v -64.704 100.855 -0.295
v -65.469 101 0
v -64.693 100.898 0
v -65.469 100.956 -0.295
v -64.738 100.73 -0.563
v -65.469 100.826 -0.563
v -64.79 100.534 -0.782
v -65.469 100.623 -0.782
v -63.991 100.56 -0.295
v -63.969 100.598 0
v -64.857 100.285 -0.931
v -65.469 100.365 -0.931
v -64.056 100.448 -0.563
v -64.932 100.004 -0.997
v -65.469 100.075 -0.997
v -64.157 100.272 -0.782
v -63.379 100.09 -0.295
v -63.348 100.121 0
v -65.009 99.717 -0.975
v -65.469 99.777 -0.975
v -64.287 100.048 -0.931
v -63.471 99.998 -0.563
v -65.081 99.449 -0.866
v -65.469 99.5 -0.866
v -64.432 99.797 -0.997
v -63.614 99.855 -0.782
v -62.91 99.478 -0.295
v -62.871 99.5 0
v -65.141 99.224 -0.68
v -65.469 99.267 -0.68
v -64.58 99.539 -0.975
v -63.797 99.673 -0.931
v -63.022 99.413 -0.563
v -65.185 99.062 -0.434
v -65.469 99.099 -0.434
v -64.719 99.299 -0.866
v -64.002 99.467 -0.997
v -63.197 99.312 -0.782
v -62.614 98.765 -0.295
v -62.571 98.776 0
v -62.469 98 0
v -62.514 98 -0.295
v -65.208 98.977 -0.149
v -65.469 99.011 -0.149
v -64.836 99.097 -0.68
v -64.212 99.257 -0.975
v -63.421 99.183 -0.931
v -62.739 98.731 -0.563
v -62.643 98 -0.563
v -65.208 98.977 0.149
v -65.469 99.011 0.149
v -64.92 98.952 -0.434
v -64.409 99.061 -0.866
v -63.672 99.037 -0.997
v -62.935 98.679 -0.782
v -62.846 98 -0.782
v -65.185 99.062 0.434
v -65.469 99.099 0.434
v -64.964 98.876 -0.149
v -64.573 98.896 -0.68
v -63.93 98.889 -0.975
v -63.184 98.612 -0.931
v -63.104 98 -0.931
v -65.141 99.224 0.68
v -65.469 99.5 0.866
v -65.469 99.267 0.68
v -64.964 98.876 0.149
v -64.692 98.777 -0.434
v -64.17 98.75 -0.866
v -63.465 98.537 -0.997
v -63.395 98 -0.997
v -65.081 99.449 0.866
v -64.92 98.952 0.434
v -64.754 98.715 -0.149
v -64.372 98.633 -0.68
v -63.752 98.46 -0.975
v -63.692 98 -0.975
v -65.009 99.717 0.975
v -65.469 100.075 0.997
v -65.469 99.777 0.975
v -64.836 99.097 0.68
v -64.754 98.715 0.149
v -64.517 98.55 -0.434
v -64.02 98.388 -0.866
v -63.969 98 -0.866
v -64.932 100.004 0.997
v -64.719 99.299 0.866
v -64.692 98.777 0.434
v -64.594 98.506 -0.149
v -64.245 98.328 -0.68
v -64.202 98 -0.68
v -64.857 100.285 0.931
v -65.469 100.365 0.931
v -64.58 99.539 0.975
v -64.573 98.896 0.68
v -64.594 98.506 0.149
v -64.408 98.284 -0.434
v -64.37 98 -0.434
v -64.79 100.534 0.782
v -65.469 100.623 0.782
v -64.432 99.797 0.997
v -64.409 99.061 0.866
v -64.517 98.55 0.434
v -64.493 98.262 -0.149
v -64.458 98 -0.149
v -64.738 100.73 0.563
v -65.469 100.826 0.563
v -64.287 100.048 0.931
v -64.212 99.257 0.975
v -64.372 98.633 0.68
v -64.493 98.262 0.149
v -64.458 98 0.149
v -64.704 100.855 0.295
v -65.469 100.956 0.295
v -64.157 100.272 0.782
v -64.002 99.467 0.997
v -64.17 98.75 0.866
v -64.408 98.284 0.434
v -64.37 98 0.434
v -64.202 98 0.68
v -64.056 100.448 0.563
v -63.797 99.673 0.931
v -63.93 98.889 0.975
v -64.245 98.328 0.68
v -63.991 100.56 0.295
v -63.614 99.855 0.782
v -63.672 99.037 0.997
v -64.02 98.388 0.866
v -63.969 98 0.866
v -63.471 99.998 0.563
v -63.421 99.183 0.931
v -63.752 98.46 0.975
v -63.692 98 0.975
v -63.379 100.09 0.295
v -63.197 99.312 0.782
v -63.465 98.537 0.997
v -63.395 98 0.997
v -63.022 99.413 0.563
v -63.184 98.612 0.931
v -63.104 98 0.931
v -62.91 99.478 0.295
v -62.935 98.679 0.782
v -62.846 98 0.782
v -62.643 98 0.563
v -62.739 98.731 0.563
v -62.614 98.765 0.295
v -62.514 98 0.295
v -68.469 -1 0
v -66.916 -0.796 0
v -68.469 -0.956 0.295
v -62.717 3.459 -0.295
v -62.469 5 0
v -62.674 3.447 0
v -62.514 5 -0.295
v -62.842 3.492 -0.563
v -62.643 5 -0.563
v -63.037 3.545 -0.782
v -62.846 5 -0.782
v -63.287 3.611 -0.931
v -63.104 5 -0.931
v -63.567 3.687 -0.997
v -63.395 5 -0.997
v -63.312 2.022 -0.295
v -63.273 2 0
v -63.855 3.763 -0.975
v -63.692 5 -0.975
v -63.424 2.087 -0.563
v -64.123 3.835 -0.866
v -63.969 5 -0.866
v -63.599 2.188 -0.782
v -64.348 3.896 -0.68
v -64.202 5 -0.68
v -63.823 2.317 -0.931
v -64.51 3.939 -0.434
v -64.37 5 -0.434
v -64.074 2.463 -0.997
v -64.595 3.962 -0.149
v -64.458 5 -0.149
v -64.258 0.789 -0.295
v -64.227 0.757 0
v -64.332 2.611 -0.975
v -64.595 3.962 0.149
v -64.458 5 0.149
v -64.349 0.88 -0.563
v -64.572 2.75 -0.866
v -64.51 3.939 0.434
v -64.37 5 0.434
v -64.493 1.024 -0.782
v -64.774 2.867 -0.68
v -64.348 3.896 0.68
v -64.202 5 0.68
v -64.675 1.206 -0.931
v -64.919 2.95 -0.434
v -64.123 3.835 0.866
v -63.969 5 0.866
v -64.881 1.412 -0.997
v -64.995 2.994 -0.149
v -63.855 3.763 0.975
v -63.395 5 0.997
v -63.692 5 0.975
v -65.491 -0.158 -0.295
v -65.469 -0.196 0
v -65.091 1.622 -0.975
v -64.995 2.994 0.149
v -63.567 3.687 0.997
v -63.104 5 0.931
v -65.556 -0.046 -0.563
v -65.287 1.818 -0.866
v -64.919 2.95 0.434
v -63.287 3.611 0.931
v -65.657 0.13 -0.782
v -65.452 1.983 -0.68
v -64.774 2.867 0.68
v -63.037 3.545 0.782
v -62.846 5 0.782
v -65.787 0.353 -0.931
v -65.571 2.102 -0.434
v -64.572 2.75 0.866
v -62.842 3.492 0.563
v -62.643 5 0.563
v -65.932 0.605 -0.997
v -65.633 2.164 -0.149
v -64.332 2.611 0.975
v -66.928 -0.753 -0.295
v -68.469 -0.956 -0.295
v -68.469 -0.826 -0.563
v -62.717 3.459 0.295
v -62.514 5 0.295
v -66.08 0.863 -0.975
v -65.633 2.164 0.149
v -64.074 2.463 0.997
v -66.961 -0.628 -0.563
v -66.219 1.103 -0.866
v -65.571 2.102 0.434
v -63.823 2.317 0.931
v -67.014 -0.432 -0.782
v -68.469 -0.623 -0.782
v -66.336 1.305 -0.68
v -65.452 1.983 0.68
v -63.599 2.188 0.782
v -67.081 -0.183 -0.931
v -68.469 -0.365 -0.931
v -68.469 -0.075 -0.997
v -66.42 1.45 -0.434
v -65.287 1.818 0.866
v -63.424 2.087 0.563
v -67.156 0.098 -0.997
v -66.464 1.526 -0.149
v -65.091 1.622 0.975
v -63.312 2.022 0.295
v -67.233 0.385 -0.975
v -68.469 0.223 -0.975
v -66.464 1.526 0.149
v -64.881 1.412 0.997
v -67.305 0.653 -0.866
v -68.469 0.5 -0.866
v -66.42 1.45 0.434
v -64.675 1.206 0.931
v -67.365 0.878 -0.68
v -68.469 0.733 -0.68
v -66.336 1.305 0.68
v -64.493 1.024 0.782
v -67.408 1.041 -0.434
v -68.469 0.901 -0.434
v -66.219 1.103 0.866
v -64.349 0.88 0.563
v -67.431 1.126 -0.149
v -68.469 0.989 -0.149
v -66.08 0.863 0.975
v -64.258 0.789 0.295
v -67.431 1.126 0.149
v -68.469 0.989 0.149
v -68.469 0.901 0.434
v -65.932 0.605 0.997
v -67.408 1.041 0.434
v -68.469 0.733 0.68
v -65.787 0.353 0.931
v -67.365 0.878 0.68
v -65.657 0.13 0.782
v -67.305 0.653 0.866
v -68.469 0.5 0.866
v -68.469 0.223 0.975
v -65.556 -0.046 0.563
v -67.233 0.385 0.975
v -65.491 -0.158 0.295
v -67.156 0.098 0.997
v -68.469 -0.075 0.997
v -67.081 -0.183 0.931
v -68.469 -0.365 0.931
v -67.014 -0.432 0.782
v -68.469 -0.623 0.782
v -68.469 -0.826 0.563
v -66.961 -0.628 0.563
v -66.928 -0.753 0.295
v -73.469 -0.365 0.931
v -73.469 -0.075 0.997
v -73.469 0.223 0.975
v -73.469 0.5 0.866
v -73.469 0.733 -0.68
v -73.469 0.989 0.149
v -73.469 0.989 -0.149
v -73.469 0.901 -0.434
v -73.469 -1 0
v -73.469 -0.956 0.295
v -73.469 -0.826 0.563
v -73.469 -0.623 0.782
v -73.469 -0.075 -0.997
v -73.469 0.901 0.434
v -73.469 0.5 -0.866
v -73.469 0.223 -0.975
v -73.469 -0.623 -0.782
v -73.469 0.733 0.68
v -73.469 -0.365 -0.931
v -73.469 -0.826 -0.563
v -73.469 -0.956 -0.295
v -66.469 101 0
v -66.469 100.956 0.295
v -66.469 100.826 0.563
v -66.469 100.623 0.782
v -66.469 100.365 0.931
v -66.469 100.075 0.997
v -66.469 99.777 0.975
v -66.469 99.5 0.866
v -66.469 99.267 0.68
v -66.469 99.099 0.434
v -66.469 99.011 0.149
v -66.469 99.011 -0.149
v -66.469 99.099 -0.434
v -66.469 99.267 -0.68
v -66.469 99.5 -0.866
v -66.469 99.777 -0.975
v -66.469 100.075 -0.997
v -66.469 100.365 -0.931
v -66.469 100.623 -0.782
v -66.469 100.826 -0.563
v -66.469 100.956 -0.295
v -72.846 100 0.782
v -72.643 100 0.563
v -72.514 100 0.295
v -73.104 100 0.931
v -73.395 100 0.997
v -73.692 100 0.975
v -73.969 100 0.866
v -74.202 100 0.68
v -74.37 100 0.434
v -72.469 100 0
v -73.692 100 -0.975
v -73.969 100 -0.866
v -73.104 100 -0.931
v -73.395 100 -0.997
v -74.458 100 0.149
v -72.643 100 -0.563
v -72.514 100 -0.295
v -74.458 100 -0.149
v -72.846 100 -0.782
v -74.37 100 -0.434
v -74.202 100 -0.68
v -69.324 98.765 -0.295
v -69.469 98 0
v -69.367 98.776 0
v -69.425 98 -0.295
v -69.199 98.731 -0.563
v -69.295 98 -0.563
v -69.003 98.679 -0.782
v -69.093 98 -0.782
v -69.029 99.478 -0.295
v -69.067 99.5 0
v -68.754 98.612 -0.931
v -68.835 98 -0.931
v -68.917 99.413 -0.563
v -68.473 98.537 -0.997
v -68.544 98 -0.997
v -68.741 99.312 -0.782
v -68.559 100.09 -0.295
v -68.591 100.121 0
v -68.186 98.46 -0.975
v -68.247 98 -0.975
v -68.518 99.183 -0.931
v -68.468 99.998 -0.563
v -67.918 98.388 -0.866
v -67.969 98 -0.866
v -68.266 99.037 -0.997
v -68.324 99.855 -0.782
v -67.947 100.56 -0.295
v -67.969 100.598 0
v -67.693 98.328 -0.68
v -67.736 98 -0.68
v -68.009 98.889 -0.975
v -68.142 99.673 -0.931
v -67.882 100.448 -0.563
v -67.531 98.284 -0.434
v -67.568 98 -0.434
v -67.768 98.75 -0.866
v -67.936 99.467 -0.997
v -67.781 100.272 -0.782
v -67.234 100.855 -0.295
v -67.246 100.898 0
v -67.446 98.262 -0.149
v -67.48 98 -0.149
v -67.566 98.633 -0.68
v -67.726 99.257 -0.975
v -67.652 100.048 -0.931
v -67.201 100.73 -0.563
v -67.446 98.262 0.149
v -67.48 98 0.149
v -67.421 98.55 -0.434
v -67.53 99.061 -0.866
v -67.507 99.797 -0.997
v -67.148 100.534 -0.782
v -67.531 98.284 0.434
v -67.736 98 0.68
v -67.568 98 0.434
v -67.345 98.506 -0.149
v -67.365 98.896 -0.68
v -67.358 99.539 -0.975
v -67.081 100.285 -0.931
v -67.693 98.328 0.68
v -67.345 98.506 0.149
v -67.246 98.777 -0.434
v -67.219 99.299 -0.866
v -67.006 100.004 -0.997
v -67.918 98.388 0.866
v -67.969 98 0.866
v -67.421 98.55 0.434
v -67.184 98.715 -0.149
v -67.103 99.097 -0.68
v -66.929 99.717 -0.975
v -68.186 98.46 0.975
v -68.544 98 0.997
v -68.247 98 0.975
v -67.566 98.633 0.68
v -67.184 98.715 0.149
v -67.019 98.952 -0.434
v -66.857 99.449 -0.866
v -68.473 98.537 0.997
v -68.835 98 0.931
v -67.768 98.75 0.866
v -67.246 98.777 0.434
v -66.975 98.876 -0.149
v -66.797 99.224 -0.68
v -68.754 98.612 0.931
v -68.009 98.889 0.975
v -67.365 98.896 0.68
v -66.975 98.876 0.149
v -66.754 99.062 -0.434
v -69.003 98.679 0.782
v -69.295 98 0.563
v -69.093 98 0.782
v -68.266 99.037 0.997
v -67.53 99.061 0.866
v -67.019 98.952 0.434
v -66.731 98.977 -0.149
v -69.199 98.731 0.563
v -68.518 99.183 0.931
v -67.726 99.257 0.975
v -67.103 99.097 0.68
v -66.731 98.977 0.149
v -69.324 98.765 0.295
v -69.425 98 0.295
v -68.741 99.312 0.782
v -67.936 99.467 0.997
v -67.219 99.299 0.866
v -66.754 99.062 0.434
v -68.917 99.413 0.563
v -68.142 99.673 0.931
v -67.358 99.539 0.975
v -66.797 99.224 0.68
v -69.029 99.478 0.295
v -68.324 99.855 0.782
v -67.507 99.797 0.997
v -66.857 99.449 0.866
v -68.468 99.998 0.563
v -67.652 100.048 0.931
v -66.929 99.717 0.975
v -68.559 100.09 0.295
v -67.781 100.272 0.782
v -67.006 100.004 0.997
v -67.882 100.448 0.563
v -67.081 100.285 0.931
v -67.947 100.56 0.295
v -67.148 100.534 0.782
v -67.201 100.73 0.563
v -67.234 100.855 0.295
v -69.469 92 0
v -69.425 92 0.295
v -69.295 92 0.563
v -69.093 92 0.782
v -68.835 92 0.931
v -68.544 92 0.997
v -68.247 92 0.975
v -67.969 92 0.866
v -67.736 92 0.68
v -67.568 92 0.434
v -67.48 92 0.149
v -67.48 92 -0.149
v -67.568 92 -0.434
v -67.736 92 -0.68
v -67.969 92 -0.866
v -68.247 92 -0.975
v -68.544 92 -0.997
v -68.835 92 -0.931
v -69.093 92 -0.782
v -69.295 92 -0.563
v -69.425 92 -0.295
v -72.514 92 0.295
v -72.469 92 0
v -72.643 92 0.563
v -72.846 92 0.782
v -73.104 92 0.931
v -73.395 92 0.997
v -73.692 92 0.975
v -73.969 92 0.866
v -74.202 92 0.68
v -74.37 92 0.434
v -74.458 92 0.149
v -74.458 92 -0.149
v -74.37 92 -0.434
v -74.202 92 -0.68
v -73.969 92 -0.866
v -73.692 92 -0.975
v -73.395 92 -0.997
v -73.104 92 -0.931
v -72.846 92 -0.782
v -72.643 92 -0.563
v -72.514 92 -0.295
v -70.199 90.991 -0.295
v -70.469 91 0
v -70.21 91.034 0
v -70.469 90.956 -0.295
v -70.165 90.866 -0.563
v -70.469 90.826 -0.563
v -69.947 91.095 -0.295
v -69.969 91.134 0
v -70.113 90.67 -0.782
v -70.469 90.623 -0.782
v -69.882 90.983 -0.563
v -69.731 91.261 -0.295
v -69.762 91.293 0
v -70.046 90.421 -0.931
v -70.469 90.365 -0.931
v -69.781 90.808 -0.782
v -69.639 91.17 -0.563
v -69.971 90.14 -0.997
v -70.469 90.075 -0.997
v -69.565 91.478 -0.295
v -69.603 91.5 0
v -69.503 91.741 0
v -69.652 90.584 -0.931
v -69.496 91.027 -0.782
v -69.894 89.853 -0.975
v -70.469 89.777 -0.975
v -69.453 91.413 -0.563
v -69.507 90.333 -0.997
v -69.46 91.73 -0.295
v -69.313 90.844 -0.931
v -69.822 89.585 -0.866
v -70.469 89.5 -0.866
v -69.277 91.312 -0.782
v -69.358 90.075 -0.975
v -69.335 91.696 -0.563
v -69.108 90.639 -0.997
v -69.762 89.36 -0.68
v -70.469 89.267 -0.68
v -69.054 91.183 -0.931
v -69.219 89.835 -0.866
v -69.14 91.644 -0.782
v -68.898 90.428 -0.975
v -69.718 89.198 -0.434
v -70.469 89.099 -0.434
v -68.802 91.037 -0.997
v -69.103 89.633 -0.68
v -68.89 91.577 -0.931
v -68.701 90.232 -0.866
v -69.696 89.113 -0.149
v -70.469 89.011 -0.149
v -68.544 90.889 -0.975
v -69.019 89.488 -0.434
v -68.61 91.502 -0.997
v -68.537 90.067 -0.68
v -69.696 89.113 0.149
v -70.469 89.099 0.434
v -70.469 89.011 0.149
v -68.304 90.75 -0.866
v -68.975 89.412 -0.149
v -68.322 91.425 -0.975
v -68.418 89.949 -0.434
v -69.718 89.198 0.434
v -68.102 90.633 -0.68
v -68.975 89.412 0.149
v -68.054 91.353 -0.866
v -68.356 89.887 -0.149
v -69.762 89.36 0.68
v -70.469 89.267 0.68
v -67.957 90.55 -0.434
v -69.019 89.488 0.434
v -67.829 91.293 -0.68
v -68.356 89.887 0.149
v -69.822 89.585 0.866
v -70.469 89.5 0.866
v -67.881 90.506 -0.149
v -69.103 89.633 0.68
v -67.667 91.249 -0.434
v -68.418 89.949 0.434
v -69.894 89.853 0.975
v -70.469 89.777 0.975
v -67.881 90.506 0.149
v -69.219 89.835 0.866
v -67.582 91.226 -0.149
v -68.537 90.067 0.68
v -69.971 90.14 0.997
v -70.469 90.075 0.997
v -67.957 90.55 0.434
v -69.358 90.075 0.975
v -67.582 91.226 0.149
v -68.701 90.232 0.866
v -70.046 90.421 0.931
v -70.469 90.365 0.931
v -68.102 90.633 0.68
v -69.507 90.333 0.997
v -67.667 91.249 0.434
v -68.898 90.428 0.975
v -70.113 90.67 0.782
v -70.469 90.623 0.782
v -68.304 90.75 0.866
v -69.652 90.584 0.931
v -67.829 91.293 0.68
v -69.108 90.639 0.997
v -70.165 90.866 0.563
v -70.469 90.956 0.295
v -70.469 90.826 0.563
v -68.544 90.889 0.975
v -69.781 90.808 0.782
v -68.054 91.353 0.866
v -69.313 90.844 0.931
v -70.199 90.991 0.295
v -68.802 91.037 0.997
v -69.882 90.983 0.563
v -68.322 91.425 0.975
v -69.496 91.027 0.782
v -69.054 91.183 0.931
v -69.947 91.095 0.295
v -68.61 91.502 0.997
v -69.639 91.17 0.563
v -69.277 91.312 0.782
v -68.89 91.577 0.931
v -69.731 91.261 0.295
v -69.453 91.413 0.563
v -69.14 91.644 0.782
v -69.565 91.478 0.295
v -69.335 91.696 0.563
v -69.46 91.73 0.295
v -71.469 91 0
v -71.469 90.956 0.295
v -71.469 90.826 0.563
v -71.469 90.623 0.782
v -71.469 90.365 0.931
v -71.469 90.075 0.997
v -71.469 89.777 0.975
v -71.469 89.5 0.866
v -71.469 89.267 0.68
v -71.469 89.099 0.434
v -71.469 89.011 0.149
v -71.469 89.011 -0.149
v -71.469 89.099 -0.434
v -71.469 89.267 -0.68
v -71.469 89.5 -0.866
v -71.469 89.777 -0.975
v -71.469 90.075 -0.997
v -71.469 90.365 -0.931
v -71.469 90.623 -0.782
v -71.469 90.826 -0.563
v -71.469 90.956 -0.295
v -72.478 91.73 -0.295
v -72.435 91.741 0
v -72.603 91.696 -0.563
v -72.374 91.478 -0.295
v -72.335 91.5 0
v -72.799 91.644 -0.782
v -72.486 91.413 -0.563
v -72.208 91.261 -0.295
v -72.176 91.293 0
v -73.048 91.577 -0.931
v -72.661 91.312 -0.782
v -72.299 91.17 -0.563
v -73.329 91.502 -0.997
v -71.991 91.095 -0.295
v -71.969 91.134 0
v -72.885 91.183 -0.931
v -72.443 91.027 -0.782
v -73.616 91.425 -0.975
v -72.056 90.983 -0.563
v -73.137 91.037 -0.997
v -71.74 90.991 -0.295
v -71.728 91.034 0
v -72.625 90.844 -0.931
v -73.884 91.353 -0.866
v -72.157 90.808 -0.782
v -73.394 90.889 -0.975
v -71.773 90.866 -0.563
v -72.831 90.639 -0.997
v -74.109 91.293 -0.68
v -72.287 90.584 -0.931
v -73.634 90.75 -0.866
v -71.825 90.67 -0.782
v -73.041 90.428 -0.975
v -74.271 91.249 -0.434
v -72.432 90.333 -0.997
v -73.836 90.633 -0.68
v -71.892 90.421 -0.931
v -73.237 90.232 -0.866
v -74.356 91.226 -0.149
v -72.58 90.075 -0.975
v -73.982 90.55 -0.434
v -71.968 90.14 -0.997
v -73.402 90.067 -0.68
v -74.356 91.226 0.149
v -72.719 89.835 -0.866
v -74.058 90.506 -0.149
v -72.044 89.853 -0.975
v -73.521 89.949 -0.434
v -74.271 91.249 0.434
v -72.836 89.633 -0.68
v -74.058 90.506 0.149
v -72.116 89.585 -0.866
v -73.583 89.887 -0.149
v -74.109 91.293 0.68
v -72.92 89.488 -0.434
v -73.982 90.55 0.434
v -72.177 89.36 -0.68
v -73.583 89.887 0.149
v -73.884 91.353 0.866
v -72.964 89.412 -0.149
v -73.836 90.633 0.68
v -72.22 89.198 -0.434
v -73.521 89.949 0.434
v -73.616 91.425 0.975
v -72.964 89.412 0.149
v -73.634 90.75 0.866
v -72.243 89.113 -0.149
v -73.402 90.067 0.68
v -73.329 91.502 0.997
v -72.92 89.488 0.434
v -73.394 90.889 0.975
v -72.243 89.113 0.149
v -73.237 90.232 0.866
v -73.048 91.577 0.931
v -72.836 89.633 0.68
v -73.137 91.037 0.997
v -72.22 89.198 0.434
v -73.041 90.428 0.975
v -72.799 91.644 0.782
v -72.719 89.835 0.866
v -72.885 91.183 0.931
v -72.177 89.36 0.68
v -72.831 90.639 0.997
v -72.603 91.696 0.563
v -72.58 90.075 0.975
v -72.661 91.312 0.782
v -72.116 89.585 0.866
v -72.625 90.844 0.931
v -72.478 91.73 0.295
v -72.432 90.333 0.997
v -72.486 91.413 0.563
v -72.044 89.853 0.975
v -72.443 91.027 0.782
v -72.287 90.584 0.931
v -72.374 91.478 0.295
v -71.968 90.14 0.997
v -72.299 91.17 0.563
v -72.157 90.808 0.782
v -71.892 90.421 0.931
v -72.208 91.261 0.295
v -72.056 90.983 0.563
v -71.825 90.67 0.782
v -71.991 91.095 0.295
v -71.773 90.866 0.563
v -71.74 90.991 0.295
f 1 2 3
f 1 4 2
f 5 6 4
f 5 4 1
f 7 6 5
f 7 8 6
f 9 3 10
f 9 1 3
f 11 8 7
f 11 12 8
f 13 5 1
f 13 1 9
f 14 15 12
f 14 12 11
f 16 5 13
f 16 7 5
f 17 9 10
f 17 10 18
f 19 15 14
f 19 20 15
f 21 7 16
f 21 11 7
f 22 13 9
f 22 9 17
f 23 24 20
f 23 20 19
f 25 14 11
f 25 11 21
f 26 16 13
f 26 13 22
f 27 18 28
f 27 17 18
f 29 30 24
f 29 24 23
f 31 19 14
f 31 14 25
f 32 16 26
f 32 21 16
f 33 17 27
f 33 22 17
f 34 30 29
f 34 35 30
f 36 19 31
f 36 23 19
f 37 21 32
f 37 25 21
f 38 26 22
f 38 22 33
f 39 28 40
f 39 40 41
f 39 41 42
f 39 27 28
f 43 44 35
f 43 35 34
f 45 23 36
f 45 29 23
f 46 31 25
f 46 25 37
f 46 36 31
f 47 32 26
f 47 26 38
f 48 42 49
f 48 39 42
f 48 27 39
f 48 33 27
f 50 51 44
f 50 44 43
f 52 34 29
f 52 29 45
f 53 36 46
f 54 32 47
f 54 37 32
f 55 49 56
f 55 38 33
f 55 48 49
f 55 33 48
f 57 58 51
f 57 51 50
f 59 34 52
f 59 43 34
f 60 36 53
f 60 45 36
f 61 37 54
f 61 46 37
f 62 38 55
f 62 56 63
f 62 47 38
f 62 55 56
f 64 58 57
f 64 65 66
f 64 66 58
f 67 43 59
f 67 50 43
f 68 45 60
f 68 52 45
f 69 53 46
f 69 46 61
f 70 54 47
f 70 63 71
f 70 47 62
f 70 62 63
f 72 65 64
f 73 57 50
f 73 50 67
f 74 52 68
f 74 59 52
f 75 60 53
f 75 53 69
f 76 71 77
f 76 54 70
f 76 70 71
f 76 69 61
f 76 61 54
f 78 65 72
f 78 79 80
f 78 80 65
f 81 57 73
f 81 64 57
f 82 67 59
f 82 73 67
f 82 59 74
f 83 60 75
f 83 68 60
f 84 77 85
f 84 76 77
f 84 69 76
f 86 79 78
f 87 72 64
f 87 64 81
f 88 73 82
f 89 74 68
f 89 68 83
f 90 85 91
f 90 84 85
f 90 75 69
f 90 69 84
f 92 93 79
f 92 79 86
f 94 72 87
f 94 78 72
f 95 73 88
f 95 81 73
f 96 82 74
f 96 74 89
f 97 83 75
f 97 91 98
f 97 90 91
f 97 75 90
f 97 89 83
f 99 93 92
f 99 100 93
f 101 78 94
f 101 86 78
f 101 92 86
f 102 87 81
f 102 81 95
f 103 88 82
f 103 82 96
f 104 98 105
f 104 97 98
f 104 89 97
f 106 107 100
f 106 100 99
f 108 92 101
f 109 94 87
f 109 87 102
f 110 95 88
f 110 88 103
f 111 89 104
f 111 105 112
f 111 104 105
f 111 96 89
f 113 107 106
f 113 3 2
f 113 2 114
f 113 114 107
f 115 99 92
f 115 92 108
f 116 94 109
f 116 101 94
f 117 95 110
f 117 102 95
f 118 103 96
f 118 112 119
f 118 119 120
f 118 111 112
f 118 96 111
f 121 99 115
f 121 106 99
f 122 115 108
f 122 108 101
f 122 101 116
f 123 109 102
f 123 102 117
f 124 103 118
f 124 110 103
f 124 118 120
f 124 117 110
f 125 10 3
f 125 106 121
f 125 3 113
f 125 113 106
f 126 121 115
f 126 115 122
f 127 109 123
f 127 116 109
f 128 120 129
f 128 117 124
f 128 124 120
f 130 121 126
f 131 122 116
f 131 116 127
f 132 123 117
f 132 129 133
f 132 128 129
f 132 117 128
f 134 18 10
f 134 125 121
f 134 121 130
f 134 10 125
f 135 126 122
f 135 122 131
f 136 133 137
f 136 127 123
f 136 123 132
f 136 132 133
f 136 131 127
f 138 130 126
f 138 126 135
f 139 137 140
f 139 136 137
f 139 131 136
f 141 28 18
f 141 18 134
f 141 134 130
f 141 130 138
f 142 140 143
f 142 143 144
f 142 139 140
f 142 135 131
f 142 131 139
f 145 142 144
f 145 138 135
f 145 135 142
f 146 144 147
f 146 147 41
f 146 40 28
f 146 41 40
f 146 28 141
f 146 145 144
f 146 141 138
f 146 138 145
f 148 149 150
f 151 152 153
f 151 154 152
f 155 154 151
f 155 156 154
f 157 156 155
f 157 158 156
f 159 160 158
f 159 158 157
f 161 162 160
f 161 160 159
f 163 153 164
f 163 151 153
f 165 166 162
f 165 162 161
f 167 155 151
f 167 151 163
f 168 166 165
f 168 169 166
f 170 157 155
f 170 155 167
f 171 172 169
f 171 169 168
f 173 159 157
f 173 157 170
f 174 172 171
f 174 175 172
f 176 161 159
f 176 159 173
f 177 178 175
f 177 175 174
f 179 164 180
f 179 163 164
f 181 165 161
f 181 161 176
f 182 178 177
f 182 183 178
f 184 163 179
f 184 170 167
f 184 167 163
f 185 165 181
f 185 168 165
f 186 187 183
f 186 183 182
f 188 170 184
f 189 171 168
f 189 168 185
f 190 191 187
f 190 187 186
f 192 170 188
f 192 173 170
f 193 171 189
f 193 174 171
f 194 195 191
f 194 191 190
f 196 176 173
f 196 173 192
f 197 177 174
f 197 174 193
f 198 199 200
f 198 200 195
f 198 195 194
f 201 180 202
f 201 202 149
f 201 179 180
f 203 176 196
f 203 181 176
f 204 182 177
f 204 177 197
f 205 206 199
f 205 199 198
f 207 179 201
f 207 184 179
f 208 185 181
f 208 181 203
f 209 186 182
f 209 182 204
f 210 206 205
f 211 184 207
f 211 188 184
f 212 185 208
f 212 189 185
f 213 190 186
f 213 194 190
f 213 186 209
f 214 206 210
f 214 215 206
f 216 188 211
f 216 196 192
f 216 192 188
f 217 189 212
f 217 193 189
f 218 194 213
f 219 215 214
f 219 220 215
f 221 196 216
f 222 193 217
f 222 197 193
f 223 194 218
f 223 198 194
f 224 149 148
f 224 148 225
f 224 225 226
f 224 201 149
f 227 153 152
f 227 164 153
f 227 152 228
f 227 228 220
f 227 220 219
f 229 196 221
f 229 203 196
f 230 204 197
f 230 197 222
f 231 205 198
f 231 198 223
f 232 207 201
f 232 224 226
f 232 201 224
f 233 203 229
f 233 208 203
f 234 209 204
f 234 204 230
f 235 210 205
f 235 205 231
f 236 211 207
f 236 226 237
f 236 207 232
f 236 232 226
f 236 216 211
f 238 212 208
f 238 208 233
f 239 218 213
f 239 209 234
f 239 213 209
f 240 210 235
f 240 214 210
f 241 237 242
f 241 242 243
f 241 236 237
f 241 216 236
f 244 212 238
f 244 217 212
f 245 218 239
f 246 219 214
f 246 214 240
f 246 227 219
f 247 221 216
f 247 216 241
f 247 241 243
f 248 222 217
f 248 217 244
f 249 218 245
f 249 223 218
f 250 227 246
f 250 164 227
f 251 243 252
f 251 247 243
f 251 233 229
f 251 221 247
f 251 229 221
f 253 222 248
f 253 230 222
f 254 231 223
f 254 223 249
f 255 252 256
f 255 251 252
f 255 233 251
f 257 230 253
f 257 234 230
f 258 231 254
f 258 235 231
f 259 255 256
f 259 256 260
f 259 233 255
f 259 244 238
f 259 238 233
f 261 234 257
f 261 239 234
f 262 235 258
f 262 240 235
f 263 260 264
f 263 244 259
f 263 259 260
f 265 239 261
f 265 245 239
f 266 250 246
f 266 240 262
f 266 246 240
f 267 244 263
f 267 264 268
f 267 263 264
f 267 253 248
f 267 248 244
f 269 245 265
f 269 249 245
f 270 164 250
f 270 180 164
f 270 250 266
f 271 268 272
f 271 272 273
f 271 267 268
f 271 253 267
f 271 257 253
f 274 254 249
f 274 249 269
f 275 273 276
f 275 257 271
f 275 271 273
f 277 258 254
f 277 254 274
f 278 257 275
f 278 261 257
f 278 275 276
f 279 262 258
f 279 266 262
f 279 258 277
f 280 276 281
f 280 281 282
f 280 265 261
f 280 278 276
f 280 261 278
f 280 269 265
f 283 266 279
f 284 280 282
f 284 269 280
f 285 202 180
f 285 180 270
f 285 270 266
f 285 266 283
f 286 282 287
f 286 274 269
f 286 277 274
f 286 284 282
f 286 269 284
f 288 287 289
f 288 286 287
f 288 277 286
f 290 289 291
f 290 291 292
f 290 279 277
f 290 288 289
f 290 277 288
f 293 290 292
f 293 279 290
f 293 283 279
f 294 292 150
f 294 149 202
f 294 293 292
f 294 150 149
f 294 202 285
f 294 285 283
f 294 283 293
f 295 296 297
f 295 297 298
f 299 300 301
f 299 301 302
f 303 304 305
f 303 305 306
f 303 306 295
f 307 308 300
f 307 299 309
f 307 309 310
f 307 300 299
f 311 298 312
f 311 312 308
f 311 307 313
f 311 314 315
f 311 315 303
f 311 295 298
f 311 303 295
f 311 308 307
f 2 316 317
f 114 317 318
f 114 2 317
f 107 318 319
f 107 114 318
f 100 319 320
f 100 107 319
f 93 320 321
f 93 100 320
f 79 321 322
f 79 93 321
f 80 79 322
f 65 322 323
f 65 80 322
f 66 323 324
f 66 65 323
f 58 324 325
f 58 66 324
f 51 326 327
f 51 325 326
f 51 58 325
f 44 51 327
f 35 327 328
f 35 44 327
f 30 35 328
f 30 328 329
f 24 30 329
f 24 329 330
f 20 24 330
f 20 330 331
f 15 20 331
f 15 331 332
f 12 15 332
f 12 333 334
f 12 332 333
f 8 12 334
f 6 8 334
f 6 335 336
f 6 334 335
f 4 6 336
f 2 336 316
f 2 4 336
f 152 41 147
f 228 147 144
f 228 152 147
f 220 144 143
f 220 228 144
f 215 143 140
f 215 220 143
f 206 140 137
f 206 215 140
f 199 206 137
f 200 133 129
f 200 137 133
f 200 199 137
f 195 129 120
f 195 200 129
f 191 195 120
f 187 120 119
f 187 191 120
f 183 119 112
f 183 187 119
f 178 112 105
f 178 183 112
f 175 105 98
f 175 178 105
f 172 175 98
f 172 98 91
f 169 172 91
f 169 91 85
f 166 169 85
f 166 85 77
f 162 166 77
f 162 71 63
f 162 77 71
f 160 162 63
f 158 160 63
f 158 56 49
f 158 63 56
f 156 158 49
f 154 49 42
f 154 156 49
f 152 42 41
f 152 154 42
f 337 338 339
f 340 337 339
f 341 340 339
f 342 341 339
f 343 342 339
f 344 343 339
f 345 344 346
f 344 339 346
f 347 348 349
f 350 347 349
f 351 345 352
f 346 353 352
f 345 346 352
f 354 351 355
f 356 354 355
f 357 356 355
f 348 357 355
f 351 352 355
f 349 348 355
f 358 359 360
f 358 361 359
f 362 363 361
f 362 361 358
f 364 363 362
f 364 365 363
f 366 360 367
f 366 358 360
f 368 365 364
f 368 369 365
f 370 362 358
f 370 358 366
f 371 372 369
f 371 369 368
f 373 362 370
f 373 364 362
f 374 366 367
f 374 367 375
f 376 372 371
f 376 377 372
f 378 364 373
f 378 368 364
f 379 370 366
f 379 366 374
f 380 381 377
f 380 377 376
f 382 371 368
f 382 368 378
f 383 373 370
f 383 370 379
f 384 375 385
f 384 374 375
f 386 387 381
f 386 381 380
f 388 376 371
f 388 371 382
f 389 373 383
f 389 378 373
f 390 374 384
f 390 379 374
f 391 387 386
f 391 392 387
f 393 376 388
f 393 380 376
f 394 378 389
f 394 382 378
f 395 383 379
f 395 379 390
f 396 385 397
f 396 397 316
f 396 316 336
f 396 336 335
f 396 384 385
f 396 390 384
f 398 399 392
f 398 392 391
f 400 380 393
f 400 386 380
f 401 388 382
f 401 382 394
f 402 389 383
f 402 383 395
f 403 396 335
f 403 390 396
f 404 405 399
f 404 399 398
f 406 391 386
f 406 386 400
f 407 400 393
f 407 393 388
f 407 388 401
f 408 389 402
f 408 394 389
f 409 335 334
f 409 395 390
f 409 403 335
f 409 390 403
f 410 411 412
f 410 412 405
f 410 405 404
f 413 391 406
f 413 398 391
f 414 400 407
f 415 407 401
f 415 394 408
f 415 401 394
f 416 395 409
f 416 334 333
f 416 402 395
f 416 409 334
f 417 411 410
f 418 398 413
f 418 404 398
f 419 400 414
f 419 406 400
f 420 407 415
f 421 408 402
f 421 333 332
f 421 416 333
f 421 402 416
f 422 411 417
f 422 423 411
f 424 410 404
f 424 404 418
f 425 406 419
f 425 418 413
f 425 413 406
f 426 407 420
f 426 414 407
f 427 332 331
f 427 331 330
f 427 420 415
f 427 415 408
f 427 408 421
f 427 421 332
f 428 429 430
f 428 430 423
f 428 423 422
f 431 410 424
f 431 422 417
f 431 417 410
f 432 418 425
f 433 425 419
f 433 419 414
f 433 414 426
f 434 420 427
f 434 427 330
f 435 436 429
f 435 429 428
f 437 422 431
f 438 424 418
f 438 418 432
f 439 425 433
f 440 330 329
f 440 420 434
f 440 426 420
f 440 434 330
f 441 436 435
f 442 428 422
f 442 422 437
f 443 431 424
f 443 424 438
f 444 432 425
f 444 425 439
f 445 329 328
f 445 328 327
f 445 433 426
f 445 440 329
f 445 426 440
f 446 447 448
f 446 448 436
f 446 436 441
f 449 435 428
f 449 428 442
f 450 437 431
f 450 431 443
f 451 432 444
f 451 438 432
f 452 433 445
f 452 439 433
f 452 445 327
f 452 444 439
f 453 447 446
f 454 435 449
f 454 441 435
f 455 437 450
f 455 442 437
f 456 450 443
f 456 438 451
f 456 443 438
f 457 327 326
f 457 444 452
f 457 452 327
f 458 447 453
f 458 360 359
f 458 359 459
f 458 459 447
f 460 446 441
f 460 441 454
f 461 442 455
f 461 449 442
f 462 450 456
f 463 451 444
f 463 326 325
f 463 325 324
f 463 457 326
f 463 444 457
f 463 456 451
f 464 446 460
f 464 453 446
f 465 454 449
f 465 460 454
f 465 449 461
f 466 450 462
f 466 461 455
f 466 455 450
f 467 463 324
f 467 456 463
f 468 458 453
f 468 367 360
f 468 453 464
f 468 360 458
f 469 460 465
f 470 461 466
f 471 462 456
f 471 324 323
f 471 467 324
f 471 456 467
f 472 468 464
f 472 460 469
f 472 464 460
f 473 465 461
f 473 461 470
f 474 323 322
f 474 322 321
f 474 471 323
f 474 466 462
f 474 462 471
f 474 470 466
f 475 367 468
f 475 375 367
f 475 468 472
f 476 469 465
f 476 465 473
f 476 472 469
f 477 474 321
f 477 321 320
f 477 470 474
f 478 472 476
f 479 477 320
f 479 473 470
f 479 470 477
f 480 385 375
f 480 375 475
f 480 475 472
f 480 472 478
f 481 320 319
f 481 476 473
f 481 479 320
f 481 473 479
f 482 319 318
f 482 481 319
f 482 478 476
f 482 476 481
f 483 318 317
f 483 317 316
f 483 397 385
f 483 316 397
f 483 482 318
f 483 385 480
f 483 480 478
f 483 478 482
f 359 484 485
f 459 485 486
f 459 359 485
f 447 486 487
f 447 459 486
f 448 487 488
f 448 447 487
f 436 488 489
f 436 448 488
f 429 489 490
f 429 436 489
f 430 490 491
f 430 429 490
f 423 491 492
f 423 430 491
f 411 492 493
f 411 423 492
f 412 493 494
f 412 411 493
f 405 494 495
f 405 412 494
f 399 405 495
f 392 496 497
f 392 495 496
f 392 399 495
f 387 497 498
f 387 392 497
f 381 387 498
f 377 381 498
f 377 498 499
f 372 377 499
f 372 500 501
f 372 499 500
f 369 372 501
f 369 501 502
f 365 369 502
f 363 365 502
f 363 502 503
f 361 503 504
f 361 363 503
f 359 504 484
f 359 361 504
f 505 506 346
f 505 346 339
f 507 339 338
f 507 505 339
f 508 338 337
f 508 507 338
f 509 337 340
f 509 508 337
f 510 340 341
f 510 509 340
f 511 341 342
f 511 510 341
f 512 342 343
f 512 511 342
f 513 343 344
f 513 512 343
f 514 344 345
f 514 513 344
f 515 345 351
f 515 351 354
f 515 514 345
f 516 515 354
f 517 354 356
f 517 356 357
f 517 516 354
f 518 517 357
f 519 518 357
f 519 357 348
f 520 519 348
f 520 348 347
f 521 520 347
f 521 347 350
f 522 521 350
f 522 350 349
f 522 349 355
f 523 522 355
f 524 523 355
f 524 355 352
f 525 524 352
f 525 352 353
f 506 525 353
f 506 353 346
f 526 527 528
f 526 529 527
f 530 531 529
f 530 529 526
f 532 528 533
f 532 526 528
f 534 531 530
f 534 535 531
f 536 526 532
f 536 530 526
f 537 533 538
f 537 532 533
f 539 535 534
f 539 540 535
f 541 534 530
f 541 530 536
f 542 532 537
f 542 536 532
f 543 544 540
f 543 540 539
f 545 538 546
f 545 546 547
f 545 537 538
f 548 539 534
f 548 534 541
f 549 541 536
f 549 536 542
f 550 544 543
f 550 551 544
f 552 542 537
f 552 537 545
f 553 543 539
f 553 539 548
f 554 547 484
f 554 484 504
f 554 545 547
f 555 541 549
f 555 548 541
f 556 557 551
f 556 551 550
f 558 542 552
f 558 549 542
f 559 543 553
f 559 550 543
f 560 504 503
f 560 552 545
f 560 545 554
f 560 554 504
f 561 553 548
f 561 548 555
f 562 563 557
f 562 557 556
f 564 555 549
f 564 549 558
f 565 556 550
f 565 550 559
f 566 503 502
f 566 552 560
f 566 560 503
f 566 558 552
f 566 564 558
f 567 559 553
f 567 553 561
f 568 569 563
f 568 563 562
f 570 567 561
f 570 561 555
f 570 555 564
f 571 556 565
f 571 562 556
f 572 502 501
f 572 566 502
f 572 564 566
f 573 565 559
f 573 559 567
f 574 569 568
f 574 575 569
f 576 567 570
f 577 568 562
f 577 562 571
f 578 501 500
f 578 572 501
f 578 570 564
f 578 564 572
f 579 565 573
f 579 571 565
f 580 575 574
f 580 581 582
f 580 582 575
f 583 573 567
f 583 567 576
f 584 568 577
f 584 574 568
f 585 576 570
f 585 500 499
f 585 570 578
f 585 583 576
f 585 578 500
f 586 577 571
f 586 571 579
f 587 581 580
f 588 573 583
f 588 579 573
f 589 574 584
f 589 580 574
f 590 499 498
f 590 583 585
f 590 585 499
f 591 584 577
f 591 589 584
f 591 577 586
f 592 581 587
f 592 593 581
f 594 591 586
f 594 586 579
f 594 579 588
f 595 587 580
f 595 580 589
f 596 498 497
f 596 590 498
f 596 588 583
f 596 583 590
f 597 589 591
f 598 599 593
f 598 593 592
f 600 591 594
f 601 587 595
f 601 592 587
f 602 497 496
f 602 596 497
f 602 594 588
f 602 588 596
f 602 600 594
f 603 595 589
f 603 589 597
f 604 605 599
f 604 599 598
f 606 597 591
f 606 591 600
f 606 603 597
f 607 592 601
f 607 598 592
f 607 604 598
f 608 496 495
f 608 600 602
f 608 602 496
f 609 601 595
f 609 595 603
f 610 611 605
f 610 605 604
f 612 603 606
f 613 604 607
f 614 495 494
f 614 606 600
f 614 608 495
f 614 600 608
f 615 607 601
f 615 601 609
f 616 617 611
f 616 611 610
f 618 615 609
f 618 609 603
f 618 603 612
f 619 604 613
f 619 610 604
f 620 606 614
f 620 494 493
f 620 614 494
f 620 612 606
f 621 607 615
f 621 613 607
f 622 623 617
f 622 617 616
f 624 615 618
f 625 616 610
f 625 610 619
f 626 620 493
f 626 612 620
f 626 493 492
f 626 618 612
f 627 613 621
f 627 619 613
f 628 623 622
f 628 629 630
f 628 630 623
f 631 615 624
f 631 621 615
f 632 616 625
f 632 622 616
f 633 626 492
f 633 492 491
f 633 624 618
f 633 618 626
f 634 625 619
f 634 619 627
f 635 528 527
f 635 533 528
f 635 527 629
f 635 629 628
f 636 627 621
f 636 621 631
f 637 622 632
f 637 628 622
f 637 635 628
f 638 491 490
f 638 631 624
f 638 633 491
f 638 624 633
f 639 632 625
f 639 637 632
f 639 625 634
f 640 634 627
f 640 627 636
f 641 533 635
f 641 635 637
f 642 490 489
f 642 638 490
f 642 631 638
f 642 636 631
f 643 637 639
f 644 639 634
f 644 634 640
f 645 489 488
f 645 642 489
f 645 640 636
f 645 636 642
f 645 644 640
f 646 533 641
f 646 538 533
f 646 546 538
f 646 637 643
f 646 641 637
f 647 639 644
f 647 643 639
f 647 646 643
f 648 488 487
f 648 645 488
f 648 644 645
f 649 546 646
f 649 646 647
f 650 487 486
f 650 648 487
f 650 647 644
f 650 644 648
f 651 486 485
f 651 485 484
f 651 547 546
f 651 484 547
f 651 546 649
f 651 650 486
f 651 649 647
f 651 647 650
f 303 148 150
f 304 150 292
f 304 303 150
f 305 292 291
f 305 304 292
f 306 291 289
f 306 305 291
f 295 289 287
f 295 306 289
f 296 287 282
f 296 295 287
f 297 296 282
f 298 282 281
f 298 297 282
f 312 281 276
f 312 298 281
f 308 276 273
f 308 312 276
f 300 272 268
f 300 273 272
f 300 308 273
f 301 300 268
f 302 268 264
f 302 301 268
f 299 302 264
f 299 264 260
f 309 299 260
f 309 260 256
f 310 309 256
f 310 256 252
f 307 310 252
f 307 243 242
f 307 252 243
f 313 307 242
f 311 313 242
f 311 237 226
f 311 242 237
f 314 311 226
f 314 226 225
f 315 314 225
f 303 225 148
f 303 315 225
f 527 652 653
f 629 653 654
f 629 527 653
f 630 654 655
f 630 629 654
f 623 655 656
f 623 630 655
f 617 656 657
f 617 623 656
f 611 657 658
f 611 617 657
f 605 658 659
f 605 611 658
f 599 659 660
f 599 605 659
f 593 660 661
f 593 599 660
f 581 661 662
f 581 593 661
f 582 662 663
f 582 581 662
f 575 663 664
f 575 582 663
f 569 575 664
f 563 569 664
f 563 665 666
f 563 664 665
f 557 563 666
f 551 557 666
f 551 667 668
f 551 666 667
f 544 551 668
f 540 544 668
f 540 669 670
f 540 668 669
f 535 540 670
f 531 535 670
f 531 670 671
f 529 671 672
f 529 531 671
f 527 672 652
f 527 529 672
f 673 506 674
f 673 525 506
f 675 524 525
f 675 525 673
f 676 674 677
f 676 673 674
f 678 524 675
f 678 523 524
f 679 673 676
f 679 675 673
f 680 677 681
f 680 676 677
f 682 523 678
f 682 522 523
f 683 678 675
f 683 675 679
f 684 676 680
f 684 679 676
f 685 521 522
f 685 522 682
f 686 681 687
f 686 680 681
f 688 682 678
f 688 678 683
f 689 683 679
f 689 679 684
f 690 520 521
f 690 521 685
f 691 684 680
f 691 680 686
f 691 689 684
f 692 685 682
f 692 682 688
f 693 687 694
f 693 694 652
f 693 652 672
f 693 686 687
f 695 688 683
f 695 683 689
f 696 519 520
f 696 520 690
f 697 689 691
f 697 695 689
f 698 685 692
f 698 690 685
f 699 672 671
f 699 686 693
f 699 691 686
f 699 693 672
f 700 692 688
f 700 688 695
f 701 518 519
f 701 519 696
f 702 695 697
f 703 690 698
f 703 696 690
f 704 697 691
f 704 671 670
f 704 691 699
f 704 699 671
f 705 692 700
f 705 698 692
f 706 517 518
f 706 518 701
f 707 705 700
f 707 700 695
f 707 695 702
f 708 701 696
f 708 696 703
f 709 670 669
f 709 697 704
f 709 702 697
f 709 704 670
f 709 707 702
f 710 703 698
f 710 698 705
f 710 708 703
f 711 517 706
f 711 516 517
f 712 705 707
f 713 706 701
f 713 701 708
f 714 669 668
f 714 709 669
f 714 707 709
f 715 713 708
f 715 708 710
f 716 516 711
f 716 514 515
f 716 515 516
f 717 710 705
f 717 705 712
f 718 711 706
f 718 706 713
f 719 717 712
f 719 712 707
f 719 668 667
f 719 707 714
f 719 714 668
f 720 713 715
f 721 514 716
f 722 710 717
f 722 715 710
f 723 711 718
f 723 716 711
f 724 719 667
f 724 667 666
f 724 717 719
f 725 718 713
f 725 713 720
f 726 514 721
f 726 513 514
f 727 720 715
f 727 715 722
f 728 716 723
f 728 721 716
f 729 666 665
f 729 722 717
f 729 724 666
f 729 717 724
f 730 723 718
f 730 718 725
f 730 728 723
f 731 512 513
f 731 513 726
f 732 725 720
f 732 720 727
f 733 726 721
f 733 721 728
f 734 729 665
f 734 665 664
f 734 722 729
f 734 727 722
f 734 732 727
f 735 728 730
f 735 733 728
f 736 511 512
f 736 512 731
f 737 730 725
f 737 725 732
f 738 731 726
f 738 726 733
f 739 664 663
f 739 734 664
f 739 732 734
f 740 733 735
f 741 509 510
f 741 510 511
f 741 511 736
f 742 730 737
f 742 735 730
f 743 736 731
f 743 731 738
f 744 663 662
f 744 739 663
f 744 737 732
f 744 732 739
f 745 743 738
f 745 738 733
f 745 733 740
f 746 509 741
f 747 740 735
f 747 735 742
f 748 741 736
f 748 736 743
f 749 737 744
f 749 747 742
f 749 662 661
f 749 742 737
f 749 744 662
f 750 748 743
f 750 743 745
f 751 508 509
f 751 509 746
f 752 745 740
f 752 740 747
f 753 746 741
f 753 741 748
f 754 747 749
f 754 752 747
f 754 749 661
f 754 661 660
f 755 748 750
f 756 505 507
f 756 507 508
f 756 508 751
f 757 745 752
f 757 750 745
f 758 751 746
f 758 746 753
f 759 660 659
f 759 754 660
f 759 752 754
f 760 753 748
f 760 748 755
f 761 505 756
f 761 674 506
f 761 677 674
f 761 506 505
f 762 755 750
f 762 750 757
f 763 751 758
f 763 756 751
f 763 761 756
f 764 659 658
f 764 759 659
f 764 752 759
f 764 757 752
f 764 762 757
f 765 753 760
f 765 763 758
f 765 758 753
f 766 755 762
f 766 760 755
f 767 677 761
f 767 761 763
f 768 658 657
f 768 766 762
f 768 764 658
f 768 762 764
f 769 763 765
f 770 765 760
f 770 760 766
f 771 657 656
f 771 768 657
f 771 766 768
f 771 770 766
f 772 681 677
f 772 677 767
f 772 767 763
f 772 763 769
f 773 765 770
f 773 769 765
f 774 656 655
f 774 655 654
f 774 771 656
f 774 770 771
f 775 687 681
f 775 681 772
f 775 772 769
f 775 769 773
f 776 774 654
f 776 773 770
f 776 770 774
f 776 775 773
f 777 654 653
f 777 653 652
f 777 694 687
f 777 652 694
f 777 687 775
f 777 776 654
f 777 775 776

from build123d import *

# Parameters (mm, degrees)
F2_R = 1


# Not quite as in the source:
# - a feature names something its author has since deleted; it is built from what else it names


with BuildPart() as f3:
    # F3: sweep along a path in F0
    with BuildLine(Plane.XY) as f3_path:
        Line((-73.4692310878, 100), (-73.4692310878, 92))
        ThreePointArc((-73.4692310878, 92), (-72.8834446502, 90.5857864376), (-71.4692310878, 90))
        Line((-71.4692310878, 90), (-70.4692310878, 90))
        ThreePointArc((-70.4692310878, 90), (-69.0550175254, 90.5857864376), (-68.4692310878, 92))
        Line((-68.4692310878, 92), (-68.4692310878, 98))
        ThreePointArc((-68.4692310878, 98), (-67.8834446502, 99.4142135624), (-66.4692310878, 100))
        Line((-66.4692310878, 100), (-65.4692310878, 100))
        ThreePointArc((-65.4692310878, 100), (-64.0550175254, 99.4142135624), (-63.4692310878, 98))
        Line((-63.4692310878, 98), (-63.4692310878, 5))
        ThreePointArc((-63.4692310878, 5), (-64.9336971819, 1.4644660941), (-68.4692310878, 0))
        Line((-68.4692310878, 0), (-73.4692310878, 0))
    # F2 (on plane+point) → F3 (sweep)
    with BuildSketch(Plane.XZ.offset(-100)):
        with Locations((-73.4692310878, 0)):
            Circle(F2_R)
    sweep(path=f3_path.line)


solid = f3.part
